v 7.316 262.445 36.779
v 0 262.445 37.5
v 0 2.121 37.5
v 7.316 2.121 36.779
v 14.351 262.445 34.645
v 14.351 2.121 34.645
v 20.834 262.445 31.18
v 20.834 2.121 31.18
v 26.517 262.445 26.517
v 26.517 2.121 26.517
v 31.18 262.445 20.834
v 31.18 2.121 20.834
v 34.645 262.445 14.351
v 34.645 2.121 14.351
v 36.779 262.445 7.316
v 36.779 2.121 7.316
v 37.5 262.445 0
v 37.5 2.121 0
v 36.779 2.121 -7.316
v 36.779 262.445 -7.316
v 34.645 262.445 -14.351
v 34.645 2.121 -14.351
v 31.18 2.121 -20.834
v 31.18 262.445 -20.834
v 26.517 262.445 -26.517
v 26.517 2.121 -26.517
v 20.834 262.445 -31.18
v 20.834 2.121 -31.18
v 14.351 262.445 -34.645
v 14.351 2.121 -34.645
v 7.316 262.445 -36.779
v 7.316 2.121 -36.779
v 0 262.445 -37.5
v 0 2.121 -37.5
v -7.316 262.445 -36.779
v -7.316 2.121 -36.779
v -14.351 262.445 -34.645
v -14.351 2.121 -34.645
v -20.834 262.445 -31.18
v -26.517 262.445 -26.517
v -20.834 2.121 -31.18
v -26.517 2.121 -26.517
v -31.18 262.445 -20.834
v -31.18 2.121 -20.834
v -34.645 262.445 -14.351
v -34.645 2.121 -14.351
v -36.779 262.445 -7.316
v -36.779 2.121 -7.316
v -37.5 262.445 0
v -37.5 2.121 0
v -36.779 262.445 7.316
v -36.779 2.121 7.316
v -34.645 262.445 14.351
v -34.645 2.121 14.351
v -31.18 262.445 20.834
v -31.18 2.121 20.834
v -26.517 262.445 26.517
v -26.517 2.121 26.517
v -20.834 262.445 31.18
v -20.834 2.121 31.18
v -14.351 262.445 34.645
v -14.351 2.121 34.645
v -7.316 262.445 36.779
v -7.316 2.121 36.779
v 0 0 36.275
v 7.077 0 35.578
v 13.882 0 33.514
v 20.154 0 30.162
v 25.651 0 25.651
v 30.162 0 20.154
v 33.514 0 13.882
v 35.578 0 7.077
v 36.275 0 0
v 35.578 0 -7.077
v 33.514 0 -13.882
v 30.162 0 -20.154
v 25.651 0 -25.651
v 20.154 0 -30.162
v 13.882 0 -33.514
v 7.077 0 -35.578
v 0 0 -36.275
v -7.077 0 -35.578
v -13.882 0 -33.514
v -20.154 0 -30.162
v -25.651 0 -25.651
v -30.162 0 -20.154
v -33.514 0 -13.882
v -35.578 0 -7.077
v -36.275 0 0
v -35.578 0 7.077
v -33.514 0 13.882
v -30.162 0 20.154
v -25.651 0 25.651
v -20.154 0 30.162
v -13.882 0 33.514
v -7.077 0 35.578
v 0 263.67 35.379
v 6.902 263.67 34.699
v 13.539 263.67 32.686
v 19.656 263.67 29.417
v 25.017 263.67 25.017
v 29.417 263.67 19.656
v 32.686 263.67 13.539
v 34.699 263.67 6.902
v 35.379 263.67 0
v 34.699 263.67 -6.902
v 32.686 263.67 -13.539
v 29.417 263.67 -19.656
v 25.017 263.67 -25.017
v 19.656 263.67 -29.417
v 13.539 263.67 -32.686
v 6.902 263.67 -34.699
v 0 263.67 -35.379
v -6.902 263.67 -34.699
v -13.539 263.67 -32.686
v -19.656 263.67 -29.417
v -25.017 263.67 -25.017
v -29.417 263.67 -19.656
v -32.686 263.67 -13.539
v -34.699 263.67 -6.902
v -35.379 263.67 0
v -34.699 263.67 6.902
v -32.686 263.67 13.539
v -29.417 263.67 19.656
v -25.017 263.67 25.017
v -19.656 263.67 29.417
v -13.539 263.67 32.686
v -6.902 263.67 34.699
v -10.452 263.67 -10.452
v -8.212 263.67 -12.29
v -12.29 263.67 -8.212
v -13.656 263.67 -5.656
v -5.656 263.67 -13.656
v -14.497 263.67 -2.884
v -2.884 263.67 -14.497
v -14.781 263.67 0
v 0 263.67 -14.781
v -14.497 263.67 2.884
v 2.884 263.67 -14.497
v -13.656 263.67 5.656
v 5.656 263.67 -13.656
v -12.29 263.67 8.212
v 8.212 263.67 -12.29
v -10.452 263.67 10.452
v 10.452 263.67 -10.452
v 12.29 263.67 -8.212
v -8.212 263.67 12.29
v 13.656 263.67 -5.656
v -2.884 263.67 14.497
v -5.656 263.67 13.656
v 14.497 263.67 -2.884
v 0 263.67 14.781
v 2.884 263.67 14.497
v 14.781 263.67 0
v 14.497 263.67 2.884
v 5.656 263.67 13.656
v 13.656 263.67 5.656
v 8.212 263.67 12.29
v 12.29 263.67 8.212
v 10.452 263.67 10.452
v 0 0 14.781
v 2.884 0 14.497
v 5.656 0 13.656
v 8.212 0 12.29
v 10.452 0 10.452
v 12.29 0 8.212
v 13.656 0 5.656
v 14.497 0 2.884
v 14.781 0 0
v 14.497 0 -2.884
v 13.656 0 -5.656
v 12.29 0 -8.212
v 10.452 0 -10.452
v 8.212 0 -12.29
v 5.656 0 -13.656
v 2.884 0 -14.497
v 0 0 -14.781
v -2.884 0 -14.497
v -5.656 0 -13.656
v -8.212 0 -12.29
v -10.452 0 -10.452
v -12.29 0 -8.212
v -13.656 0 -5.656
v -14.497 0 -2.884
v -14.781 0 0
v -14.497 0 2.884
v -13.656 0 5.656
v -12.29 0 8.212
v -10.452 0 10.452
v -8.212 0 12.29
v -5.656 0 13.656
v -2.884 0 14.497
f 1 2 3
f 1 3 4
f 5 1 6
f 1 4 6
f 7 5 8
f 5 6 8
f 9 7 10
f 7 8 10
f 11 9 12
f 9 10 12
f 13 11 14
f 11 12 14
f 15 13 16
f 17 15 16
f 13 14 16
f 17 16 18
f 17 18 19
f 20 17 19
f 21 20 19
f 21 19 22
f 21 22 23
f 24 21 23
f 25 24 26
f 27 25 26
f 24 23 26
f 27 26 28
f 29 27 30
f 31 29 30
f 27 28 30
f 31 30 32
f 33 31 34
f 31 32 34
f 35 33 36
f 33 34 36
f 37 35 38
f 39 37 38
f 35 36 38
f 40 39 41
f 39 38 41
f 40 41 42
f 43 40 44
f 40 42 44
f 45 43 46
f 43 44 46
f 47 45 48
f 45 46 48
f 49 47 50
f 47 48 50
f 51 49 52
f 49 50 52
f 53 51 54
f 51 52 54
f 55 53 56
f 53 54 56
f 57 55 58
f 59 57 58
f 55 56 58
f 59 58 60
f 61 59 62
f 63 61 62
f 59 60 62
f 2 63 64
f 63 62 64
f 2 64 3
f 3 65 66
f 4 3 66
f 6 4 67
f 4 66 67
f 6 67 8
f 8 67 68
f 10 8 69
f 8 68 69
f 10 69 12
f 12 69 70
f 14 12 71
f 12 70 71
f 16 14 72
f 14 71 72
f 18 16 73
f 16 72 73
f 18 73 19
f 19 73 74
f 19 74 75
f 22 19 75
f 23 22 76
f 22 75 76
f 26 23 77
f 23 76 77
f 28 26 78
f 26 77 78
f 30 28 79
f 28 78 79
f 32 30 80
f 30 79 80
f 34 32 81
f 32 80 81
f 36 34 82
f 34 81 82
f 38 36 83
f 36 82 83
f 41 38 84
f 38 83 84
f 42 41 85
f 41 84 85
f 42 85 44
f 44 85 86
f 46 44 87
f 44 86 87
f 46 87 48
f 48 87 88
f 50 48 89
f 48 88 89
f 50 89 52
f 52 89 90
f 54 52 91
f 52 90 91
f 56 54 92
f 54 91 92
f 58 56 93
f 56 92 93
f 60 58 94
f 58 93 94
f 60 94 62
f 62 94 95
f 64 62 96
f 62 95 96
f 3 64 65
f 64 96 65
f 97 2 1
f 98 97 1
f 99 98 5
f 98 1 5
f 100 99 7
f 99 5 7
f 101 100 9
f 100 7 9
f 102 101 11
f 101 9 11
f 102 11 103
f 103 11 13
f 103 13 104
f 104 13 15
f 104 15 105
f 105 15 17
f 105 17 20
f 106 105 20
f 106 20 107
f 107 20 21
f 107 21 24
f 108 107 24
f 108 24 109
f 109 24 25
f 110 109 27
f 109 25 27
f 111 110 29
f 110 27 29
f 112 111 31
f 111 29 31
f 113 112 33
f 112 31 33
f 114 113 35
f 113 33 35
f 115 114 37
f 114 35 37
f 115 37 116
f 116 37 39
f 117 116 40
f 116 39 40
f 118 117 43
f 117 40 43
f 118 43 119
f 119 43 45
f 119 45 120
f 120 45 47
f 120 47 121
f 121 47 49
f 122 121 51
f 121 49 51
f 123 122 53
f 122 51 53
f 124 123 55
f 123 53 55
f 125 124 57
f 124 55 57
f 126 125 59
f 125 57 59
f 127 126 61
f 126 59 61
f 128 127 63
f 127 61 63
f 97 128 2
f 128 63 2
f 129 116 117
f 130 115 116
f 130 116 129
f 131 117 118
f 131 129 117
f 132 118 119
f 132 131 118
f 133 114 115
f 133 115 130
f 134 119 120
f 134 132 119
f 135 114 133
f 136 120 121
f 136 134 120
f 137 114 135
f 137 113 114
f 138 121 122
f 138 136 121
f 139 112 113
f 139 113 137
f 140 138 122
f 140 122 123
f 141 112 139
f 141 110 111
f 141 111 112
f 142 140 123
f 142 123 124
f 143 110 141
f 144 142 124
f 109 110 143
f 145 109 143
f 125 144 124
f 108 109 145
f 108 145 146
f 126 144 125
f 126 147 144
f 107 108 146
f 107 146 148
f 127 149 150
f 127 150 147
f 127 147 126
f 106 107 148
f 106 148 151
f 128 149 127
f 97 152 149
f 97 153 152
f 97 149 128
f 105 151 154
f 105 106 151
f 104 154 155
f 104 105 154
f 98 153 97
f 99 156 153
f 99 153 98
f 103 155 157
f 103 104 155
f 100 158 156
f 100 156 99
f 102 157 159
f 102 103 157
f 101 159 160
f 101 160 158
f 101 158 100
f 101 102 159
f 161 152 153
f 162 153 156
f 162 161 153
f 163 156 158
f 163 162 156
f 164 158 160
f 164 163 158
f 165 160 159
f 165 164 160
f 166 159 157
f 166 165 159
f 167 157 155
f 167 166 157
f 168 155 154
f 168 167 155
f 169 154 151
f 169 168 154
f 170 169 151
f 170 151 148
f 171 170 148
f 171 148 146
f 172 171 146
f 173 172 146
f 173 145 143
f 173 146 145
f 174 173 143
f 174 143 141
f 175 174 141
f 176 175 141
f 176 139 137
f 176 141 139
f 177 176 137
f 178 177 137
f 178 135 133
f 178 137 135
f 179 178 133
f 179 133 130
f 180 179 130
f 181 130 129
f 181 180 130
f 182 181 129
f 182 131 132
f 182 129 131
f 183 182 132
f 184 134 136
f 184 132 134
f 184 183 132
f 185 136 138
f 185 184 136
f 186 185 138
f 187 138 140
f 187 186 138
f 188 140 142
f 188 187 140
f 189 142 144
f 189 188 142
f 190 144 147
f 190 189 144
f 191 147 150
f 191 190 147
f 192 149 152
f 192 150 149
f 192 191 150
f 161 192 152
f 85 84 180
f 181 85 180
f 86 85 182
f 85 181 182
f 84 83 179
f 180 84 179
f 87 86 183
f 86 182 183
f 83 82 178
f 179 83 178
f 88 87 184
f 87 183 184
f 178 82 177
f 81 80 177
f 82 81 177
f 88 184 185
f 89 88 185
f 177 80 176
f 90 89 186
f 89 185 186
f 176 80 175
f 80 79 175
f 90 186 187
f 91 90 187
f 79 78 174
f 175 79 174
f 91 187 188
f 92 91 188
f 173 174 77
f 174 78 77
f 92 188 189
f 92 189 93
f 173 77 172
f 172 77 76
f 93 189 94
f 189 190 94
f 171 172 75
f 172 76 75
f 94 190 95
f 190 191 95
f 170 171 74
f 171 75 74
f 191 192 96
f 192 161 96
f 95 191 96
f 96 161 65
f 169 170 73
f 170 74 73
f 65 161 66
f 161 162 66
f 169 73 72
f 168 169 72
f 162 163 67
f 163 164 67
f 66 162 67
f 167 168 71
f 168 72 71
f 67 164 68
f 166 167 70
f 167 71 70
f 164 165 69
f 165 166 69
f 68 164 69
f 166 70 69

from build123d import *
from OCP.BRepFilletAPI import BRepFilletAPI_MakeChamfer

# Parameters (mm, degrees)
SKETCH1_R           = 37.5
BOSS_EXTRUDE1_DEPTH = 263.669780207
SKETCH2_R           = 14.780743644
CUT_EXTRUDE1_DEPTH  = 269.950279781
CHAMFER1_SIZE       = 1.224541606
CHAMFER1_SIZE2      = 2.120968278


with BuildPart() as part:
    # Sketch1 → Boss-Extrude1 (new body)
    with BuildSketch(Plane(origin=(0, 0, 0), x_dir=(1, 0, 0), z_dir=(0, 1, 0))):
        Circle(SKETCH1_R)
    extrude(amount=BOSS_EXTRUDE1_DEPTH)

    # Sketch2 → Cut-Extrude1 (cut, through all)
    with BuildSketch(Plane(origin=(0, 0, 0), x_dir=(1, 0, 0), z_dir=(0, 1, 0))):
        Circle(SKETCH2_R)
    extrude(amount=CUT_EXTRUDE1_DEPTH, mode=Mode.SUBTRACT)

    # Chamfer1: one chamfer whose edges measure the first distance from different faces: ONE call of the kernel's chamfer builder (chamfer() names one face for all edges)
    chamfer1_edges_1 = [part.edges().sort_by_distance(p)[0] for p in [
        (-37.5, 263.669780207, 0),
    ]]
    chamfer1_side_1 = [part.faces().sort_by_distance(p)[0] for p in [
        (-37.5, 131.834890103, 0),
    ]]
    chamfer1_edges_2 = [part.edges().sort_by_distance(p)[0] for p in [
        (-37.5, 0, 0),
    ]]
    chamfer1_side_2 = [part.faces().sort_by_distance(p)[0] for p in [
        (-36.439339828, 0, 0),
    ]]
    chamfer1 = BRepFilletAPI_MakeChamfer(part.part.solid().wrapped)
    for e in chamfer1_edges_1:
        chamfer1.Add(CHAMFER1_SIZE, CHAMFER1_SIZE2, e.wrapped, chamfer1_side_1[0].wrapped)  # the first distance lies on this face
    for e in chamfer1_edges_2:
        chamfer1.Add(CHAMFER1_SIZE, CHAMFER1_SIZE2, e.wrapped, chamfer1_side_2[0].wrapped)  # the first distance lies on this face
    add(Compound.cast(chamfer1.Shape()), mode=Mode.REPLACE)


solid = part.part
